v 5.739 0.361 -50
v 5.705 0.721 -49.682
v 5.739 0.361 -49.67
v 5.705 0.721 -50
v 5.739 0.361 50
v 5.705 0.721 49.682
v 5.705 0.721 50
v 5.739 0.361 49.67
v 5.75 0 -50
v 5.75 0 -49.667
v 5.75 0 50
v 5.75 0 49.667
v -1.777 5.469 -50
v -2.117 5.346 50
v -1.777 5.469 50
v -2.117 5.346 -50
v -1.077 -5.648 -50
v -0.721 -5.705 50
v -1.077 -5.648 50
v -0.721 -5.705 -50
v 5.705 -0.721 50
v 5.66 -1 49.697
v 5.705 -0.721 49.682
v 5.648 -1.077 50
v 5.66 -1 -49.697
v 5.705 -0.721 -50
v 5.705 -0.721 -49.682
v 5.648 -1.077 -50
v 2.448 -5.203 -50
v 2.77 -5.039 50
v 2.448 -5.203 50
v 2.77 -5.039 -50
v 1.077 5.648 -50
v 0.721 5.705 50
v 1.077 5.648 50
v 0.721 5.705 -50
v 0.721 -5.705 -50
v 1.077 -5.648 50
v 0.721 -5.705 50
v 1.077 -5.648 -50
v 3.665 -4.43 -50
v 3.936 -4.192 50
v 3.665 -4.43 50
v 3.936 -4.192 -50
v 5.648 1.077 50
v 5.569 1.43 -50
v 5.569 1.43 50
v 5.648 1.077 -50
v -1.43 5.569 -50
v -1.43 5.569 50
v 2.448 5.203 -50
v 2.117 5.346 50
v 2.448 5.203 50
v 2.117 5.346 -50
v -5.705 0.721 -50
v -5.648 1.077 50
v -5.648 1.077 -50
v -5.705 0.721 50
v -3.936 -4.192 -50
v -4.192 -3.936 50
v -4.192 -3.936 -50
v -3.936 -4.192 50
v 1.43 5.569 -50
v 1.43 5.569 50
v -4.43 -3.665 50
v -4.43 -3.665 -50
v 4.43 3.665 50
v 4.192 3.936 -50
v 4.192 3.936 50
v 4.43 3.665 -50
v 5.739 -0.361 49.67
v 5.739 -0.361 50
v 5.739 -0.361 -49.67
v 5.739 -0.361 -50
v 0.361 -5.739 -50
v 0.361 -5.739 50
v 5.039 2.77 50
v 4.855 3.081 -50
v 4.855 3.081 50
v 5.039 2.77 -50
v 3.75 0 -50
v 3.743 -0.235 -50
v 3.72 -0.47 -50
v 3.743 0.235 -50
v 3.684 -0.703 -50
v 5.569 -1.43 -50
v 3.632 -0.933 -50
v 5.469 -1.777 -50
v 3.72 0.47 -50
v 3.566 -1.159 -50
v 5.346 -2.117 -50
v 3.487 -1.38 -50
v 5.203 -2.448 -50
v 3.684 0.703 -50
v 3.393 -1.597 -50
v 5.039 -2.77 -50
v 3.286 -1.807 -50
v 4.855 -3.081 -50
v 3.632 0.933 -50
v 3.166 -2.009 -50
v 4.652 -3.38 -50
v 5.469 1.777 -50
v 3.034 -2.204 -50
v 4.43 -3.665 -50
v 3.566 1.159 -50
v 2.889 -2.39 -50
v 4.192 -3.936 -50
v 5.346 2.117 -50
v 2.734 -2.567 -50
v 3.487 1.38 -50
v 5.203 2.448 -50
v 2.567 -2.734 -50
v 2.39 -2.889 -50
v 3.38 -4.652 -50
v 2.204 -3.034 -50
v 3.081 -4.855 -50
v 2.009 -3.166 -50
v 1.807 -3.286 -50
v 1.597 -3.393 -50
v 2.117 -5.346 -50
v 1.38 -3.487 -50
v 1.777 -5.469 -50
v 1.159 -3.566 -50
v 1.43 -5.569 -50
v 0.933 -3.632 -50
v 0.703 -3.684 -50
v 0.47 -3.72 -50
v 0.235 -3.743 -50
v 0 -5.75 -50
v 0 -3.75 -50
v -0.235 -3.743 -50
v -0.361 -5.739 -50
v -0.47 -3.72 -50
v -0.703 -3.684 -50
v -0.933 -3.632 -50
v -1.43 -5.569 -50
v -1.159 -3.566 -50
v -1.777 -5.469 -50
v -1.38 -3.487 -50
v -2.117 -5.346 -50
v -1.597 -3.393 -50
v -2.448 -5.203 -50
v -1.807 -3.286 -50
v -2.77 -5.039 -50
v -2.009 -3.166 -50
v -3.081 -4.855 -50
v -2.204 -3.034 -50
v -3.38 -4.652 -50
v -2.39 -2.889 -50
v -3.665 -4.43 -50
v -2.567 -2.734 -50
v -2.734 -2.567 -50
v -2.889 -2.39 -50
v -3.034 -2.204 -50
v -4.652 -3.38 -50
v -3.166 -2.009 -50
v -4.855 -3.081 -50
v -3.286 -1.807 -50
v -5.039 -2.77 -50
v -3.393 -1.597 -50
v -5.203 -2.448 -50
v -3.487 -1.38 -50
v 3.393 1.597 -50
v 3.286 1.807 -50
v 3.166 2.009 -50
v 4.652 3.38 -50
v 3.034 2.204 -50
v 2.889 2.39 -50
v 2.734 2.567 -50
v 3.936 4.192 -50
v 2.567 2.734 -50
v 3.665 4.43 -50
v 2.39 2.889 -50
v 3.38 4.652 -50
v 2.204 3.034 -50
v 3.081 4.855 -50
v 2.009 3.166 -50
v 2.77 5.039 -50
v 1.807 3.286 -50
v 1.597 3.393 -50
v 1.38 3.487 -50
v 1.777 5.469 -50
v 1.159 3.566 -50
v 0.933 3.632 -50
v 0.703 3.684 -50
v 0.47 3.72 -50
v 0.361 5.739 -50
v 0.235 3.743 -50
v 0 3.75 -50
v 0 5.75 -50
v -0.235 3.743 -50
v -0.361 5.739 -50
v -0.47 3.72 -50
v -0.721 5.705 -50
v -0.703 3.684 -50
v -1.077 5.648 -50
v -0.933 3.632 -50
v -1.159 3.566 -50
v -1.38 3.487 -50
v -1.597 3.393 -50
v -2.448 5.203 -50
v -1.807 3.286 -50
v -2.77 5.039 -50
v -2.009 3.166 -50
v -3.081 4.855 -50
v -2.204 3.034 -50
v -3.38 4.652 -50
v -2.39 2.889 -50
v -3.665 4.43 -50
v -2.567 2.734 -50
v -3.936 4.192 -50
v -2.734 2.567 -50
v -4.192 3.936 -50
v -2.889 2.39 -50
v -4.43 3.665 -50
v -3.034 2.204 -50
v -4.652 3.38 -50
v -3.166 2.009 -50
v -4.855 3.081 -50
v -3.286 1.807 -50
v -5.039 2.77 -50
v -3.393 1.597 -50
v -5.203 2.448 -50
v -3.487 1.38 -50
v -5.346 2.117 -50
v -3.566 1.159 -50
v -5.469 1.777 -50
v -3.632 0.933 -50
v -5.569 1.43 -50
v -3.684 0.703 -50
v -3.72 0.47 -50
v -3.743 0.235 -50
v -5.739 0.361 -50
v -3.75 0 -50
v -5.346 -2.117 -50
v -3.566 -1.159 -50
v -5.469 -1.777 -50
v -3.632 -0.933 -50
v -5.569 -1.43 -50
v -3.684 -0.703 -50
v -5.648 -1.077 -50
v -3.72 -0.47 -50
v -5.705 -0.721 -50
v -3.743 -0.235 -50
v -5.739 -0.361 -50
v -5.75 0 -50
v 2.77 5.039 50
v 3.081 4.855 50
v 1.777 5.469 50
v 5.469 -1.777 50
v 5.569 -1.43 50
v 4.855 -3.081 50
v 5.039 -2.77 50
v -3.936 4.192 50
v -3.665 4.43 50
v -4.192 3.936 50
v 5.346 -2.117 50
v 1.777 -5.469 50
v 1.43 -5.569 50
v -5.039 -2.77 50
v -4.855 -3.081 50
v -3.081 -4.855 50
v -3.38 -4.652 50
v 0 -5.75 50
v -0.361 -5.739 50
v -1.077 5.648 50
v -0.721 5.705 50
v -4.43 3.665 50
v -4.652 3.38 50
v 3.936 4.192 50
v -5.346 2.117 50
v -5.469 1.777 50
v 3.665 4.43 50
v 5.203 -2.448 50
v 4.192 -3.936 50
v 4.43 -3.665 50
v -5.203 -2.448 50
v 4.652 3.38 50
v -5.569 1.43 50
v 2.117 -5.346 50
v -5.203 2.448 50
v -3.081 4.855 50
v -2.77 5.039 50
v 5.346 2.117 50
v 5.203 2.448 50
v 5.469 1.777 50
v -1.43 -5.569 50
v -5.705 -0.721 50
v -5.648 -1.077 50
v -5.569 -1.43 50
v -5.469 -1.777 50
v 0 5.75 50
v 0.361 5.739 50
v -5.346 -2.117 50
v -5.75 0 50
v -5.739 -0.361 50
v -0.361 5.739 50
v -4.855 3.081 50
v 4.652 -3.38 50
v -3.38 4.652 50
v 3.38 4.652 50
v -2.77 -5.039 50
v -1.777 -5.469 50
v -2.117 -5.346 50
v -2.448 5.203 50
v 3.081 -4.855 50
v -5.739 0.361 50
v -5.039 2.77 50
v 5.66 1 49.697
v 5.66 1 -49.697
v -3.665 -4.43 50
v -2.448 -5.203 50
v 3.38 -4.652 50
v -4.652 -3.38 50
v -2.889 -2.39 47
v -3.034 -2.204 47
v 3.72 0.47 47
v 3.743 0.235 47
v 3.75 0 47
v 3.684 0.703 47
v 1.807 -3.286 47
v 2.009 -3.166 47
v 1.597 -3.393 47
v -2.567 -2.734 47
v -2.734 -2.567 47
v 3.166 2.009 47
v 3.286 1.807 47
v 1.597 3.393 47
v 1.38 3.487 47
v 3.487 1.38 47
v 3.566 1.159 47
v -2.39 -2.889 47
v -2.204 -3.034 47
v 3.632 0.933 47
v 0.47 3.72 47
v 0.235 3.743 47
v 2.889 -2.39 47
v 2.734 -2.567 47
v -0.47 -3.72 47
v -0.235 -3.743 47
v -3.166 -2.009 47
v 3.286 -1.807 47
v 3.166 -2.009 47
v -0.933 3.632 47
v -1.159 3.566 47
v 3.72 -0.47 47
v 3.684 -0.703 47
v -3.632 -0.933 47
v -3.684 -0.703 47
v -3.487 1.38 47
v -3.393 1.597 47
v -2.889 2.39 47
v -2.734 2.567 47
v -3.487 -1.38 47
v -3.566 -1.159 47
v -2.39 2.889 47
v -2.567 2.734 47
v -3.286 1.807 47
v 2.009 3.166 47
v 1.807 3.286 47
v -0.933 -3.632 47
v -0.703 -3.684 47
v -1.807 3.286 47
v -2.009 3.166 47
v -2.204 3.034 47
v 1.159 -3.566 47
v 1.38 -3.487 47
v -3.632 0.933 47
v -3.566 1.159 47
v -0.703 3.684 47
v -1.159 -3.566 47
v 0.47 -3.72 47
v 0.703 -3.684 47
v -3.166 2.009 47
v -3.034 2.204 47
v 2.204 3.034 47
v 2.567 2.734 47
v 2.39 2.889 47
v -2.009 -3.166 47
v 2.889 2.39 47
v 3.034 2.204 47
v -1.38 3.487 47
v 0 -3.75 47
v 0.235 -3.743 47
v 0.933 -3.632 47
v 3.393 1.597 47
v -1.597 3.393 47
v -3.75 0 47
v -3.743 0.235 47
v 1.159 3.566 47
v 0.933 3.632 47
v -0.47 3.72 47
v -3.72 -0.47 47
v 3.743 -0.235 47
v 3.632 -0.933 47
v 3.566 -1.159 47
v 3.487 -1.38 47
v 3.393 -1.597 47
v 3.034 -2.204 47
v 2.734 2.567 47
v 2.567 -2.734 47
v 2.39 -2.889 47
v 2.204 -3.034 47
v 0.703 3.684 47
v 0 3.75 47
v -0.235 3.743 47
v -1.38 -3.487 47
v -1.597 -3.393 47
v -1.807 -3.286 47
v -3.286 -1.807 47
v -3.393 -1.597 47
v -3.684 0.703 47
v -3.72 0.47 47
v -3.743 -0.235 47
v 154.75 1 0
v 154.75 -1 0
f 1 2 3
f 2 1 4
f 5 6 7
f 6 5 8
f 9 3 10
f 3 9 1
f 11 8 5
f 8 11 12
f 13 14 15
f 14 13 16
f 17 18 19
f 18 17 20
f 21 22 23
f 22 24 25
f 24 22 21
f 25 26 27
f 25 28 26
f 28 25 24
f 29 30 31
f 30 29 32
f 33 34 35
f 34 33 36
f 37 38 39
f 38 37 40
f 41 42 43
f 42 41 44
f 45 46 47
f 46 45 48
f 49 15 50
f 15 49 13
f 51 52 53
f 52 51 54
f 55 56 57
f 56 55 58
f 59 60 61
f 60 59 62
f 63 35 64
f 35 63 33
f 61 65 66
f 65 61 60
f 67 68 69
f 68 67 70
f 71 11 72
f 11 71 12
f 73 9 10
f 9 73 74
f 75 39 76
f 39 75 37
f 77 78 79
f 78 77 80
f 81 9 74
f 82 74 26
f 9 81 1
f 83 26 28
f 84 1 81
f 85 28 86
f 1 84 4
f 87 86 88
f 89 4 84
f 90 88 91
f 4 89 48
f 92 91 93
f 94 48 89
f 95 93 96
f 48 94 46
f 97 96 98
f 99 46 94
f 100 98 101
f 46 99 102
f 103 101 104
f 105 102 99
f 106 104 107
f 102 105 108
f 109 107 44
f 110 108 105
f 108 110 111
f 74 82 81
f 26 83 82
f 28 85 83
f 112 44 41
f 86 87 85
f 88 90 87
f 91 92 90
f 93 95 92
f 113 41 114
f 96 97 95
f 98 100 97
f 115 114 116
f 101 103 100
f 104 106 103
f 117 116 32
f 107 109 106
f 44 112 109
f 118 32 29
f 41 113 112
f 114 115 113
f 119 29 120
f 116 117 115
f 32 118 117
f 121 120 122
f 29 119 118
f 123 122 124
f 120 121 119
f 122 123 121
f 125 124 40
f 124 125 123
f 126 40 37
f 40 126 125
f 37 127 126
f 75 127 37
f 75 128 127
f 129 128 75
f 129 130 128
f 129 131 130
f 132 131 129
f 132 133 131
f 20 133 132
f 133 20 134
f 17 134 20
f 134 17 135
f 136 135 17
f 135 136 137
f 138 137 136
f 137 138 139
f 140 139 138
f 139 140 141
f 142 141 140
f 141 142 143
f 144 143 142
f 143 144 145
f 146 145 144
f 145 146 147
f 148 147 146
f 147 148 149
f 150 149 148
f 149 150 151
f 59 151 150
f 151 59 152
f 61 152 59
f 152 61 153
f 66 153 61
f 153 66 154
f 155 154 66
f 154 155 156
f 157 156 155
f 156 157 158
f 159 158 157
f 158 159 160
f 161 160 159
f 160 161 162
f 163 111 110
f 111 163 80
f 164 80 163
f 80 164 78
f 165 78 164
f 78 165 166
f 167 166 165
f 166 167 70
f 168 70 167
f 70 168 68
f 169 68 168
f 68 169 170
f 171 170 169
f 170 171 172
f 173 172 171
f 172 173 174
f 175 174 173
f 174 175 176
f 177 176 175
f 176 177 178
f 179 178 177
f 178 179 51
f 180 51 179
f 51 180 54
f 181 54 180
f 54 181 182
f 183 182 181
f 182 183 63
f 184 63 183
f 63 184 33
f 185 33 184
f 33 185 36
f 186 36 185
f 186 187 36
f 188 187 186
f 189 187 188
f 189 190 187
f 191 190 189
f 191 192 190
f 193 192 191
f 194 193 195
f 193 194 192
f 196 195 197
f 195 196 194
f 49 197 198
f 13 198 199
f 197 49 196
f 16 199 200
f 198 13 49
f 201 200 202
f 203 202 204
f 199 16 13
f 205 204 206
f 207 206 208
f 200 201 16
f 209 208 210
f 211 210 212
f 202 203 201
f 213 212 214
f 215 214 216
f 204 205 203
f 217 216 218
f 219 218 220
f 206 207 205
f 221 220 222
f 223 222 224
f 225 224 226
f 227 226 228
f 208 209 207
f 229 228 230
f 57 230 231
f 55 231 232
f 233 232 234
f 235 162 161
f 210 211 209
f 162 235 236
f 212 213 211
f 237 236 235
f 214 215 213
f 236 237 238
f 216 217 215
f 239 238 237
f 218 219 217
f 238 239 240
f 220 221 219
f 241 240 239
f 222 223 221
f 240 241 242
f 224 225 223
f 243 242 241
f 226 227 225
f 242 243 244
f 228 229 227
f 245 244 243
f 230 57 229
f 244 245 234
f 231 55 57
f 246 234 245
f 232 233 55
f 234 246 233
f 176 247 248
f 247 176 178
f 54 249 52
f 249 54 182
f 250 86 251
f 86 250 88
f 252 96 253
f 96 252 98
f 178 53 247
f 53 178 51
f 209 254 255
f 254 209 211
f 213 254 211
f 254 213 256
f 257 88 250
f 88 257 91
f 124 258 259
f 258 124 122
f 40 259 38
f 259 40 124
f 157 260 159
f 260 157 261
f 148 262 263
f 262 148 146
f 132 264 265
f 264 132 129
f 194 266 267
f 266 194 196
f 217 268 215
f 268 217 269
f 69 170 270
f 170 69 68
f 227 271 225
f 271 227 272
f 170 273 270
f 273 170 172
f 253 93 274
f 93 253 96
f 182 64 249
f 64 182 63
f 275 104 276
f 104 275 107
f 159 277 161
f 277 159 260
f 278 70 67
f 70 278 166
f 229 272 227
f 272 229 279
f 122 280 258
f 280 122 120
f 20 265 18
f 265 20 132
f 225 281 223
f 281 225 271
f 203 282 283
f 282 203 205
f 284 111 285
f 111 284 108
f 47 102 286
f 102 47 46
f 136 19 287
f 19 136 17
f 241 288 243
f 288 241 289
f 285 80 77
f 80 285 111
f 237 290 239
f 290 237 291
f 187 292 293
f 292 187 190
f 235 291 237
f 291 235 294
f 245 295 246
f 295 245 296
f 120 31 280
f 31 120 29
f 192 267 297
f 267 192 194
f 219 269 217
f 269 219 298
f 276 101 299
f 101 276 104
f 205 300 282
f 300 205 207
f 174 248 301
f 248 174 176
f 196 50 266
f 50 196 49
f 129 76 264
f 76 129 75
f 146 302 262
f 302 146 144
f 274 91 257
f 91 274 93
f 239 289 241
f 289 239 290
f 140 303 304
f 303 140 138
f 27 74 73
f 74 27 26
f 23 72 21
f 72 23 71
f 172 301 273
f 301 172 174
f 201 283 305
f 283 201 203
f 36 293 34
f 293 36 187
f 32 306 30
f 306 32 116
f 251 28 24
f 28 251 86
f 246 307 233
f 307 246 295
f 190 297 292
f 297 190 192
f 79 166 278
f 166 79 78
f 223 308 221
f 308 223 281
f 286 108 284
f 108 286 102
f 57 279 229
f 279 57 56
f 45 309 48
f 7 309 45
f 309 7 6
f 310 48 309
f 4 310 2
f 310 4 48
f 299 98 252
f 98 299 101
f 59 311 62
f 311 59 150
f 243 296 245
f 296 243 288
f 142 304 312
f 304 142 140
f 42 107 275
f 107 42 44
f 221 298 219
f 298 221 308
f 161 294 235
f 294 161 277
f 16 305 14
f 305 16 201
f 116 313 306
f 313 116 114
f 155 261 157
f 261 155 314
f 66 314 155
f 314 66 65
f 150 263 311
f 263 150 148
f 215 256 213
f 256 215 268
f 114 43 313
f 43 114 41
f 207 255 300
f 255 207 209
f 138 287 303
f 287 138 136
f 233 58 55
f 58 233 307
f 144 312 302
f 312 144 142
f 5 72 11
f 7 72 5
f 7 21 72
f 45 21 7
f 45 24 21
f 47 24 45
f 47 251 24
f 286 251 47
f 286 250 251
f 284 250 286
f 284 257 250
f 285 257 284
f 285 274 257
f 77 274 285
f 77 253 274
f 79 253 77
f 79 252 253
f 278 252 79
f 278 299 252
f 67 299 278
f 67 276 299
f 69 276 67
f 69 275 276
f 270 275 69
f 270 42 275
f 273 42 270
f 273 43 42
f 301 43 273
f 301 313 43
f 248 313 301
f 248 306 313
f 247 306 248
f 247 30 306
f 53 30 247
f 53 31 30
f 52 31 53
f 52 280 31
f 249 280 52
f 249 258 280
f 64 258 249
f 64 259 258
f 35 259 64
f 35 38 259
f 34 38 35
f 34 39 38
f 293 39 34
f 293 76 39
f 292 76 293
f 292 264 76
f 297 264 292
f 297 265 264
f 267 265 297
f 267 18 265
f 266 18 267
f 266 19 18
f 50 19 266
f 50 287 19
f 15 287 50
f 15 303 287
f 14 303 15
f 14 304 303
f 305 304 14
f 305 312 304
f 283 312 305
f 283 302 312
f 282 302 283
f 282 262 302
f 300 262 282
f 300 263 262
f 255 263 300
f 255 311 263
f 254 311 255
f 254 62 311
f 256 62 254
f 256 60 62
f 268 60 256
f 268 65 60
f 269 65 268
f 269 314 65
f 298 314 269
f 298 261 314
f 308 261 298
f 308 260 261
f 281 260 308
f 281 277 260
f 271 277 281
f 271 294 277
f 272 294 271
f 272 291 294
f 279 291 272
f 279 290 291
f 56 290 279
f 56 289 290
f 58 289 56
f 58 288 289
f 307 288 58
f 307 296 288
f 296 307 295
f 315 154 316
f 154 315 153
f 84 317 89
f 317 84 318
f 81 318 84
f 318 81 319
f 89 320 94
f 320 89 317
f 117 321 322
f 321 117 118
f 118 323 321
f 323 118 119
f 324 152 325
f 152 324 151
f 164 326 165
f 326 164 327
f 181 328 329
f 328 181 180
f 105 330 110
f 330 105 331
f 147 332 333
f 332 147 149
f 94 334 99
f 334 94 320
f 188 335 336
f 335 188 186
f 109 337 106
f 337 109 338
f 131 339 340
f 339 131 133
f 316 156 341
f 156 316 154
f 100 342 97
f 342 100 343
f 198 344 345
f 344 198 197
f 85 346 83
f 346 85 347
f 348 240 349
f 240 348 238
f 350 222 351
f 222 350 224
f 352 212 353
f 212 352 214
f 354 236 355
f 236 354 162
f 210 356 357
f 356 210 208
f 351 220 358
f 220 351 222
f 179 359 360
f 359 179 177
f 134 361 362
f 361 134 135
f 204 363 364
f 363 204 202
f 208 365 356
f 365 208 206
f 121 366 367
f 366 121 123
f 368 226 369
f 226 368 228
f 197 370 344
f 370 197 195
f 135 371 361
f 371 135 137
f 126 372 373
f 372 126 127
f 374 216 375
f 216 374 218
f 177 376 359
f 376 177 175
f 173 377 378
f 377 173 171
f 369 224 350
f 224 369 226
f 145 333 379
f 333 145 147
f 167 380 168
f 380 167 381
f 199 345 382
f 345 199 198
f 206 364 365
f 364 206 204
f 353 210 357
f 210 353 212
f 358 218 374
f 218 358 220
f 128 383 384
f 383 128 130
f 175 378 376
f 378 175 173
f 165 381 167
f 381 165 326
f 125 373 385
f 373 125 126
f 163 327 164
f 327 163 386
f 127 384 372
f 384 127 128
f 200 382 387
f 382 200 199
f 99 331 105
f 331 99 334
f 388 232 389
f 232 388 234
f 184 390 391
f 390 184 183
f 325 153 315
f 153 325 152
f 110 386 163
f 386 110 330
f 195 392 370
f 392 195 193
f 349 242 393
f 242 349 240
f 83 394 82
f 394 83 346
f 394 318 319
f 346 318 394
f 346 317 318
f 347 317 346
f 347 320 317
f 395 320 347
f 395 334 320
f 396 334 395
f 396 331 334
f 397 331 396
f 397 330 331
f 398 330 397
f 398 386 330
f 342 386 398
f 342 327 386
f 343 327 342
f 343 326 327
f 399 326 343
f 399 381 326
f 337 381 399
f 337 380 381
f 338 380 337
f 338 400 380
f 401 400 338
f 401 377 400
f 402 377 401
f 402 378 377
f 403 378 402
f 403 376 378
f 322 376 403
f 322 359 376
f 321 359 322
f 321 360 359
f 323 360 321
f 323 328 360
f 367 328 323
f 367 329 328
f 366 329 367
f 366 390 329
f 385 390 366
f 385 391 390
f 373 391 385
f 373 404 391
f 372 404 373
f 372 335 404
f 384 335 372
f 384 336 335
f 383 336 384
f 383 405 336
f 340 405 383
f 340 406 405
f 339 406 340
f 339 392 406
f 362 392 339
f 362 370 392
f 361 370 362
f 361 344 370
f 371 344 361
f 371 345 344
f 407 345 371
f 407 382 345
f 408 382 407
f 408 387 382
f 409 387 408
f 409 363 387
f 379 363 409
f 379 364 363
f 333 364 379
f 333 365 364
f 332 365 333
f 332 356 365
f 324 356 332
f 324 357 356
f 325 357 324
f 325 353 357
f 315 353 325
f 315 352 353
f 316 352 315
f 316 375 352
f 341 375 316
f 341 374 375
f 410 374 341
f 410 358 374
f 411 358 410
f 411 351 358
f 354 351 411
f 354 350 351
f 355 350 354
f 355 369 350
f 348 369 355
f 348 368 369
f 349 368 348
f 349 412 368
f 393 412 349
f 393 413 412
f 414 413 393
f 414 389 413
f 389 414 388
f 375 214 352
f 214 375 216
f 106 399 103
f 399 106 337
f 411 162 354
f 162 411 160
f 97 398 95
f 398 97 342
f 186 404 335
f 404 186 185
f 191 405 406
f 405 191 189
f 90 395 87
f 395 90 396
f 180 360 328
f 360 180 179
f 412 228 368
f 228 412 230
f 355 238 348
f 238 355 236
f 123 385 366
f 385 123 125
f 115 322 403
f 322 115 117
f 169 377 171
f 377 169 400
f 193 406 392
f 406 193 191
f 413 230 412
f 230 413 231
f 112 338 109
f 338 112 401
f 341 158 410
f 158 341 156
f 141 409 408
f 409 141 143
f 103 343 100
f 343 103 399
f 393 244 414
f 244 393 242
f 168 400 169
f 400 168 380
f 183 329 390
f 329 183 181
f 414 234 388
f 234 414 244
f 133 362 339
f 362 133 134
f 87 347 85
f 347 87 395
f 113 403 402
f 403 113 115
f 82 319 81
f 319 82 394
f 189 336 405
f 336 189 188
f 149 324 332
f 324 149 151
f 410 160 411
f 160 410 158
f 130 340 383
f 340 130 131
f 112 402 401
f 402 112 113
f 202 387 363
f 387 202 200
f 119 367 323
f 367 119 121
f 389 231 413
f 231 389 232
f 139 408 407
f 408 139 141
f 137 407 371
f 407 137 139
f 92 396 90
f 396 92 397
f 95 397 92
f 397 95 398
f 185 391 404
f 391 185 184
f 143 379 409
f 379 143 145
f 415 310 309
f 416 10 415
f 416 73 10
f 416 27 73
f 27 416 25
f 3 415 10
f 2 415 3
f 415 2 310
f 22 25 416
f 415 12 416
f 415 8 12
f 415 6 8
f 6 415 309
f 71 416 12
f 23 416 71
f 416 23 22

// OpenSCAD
// Customizable Flag Banner
// Copyright: Olle Johansson 2018
// License: CC BY-SA

//CUSTOMIZER VARIABLES

// Height in mm of flag
height_of_flag = 100; // [100:5:200]

// Length in mm of flag
length_of_flag = 150; // [100:5:250]

// Diameter in mm of pole hole
diameter_of_hole = 7.5; // [4:0.5:16]

// Thickness in mm of flag
thickness = 2; // [2:0.1:6]

//CUSTOMIZER VARIABLES END

/* [Hidden] */

$fn = 100;

module pole() {
    difference() {
        cylinder(h = height_of_flag, d = diameter_of_hole + thickness * 2, center = true);
        translate([0, 0, -thickness])
        cylinder(h = height_of_flag - thickness, d = diameter_of_hole, center = true);
    }
}

module banner() {
    translate([diameter_of_hole / 2 + thickness / 2, 0, - height_of_flag / 2])
    rotate([90, 0, 0])
    linear_extrude(height = thickness, center = true)
    polygon(points = [
        [0, 0],
        [length_of_flag, height_of_flag / 2],
        [0, height_of_flag]
    ]);
}

module flag() {
    pole();
    banner();
}

flag();
